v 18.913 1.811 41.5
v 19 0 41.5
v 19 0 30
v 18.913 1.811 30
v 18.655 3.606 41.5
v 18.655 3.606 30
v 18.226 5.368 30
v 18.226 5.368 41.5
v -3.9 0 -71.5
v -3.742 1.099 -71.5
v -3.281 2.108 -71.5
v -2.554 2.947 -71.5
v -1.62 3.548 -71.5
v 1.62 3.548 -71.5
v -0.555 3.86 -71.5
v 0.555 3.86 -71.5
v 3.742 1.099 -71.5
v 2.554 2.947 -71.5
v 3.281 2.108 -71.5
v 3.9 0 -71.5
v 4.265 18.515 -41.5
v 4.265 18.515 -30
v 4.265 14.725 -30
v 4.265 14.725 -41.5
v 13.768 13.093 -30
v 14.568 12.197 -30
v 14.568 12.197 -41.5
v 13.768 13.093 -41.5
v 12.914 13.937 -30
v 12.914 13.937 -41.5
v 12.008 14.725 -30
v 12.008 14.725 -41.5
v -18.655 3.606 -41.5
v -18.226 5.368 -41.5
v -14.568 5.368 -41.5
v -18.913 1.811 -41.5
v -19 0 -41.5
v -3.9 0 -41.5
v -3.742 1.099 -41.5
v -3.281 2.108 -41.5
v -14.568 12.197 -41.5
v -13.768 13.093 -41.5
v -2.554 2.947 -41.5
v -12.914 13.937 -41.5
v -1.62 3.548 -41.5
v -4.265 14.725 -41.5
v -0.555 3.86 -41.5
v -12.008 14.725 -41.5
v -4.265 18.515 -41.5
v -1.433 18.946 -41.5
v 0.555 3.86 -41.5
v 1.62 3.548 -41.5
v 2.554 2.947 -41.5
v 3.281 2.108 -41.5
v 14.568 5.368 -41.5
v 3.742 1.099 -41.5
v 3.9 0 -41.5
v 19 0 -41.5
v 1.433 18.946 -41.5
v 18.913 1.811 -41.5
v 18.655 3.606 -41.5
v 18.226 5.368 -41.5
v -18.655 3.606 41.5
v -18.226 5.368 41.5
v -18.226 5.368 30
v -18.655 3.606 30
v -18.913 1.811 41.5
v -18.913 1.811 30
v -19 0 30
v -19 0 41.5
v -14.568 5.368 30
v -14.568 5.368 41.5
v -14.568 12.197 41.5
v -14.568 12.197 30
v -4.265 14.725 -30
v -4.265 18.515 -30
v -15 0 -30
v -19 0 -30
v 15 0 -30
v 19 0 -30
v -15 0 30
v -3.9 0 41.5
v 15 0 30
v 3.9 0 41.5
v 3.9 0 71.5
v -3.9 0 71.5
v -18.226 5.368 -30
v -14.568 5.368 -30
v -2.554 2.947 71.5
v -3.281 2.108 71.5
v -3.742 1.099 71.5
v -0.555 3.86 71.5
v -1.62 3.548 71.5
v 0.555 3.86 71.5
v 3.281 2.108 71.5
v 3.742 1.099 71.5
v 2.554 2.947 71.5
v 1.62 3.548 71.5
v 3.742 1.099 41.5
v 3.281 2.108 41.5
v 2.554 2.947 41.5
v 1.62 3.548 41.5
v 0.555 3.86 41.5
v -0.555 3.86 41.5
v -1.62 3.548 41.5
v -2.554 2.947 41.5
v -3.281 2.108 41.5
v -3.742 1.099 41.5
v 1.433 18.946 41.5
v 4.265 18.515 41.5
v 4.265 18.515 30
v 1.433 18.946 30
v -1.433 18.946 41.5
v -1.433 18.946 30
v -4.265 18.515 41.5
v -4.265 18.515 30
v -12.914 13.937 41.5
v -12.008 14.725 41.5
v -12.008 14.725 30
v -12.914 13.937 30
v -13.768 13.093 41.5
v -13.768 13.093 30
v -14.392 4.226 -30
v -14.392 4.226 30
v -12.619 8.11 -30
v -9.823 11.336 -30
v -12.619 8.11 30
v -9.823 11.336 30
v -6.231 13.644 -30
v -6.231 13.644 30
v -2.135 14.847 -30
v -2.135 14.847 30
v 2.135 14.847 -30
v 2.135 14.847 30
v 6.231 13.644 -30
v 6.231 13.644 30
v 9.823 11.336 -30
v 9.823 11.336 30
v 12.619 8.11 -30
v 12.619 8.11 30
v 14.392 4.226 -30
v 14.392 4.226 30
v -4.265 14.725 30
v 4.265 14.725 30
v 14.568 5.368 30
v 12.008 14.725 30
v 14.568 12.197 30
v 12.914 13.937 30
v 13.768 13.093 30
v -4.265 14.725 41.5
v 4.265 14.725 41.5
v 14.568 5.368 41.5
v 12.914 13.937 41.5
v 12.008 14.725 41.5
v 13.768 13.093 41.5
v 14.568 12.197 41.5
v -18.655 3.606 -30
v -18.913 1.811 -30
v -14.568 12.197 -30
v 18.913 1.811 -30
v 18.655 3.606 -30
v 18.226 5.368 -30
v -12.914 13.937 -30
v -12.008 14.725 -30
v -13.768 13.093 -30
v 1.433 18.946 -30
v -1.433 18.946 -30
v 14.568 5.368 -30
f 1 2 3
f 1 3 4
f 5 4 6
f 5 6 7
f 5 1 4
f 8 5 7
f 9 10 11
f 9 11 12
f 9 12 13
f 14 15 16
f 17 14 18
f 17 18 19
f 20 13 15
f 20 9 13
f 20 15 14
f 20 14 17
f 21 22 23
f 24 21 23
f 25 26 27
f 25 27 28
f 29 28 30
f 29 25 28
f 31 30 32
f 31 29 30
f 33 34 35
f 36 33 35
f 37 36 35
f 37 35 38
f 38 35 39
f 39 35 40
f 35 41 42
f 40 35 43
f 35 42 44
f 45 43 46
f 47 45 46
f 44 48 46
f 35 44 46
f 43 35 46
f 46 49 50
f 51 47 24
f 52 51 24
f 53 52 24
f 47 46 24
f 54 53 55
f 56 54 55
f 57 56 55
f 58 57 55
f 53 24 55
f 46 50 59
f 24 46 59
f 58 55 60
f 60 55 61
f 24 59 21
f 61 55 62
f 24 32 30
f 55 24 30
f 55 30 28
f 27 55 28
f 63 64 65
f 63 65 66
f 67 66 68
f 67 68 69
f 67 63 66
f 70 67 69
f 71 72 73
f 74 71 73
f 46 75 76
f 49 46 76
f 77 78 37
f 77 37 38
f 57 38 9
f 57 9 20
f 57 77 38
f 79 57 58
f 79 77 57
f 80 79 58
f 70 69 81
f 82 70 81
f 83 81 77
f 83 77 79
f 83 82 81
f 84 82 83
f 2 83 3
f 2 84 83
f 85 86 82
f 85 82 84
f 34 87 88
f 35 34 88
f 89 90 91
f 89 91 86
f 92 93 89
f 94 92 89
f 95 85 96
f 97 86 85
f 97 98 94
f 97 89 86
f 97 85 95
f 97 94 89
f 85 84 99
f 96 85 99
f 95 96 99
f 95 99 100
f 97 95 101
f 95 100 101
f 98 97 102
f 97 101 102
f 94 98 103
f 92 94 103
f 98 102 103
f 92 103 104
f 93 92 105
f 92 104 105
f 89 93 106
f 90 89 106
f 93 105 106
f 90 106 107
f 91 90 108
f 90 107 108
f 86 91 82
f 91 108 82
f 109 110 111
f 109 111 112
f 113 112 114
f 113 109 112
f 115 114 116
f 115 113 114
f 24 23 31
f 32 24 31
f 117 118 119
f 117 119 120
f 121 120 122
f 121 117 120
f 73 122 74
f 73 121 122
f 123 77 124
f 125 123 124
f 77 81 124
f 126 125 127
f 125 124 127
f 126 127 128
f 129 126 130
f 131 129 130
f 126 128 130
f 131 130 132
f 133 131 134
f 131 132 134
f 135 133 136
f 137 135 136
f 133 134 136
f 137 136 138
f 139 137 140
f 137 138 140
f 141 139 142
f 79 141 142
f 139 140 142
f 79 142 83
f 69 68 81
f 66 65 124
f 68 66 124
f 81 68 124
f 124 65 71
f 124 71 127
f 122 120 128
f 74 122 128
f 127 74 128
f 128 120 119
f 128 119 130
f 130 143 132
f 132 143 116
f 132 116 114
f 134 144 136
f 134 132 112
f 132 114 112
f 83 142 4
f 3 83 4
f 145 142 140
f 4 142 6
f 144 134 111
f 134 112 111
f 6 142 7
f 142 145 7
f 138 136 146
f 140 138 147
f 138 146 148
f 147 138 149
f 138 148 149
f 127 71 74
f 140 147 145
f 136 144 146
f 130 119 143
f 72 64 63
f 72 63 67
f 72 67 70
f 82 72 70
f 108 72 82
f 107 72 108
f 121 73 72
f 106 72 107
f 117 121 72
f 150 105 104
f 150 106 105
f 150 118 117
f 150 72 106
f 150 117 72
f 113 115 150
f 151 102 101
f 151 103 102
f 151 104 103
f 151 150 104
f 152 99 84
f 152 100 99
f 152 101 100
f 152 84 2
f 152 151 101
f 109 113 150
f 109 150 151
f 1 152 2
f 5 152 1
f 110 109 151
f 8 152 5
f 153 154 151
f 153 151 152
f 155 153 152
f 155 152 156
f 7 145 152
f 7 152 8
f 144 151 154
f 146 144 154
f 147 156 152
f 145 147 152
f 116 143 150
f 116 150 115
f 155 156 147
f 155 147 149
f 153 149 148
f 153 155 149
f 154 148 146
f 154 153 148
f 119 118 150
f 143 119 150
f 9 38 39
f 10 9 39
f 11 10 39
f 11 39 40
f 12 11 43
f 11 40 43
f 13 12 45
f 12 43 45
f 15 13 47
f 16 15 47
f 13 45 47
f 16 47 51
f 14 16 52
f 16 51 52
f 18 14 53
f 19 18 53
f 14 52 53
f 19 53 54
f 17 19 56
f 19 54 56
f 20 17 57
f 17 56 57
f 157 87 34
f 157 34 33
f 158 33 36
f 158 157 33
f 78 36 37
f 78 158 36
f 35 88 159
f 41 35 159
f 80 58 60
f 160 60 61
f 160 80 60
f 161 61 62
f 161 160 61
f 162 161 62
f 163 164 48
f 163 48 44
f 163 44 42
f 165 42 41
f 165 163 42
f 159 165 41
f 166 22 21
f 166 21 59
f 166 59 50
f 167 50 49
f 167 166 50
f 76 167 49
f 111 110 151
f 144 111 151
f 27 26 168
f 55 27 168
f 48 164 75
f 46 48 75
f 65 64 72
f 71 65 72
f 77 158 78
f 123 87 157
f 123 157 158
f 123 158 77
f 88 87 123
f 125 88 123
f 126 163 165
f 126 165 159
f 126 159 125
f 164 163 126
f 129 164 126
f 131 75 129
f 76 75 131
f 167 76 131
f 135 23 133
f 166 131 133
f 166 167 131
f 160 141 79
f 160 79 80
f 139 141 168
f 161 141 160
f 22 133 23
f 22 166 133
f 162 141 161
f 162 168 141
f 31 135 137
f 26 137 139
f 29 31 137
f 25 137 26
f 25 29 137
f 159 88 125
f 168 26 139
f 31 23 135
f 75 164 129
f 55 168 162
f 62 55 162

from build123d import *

# Parameters (mm, degrees)
F1_DEPTH = 41.5
F3_DEPTH = 30
F5_DEPTH = 30
F7_DEPTH = 113.001
F9_DEPTH = 30


with BuildPart() as f1:
    # F0 (on Top) → F1 (new body, symmetric)
    with BuildSketch(Plane.XY):
        with BuildLine():
            Line((-19, 0), (19, 0))
            ThreePointArc((19, 0), (0, 19), (-19, 0))
        make_face()
    extrude(amount=F1_DEPTH, both=True)

    # F2 (on face) → F3 (join)
    with BuildSketch(Plane.XY.offset(41.5)):
        with BuildLine():
            Line((-3.9, 0), (3.9, 0))
            ThreePointArc((3.9, 0), (0, 3.9), (-3.9, 0))
        make_face()
    extrude(amount=F3_DEPTH)

    # F4 (on face) → F5 (join)
    with BuildSketch(Plane(origin=(0, 0, -41.5), x_dir=(1, 0, 0), z_dir=(0, 0, -1))):
        with BuildLine():
            Line((3.9, 0), (-3.9, 0))
            ThreePointArc((-3.9, 0), (0, -3.9), (3.9, 0))
        make_face()
    extrude(amount=F5_DEPTH)

    # F6 (on face) → F7 (cut, through all)
    with BuildSketch(Plane.XY.offset(41.5)):
        with BuildLine():
            Line((-14.568067, 5.368078), (-14.568067, 12.197189))
            ThreePointArc((-14.568067, 12.197189), (-16.748743, 8.971042), (-18.225909, 5.368078))
            Line((-18.225909, 5.368078), (-14.568067, 5.368078))
        make_face()
        with BuildLine():
            Line((-4.264999, 14.724803), (-4.264999, 18.515123))
            ThreePointArc((-4.264999, 18.515123), (-8.354055, 17.06487), (-12.007505, 14.724803))
            Line((-12.007505, 14.724803), (-4.264999, 14.724803))
        make_face()
        with BuildLine():
            ThreePointArc((12.007505, 14.724803), (8.354055, 17.06487), (4.264999, 18.515123))
            Line((4.264999, 18.515123), (4.264999, 14.724803))
            Line((4.264999, 14.724803), (12.007505, 14.724803))
        make_face()
        with BuildLine():
            ThreePointArc((18.225909, 5.368078), (16.748743, 8.971042), (14.568067, 12.197189))
            Line((14.568067, 12.197189), (14.568067, 5.368078))
            Line((14.568067, 5.368078), (18.225909, 5.368078))
        make_face()
    extrude(amount=-F7_DEPTH, mode=Mode.SUBTRACT)

    # F8 (on Top) → F9 (cut, symmetric)
    with BuildSketch(Plane.XY):
        with BuildLine():
            Line((15, 0), (22.459483, 0))
            ThreePointArc((22.459483, 0), (0, 22.459483), (-22.459483, 0))
            Line((-22.459483, 0), (-15, 0))
            ThreePointArc((-15, 0), (0, 15), (15, 0))
        make_face()
    extrude(amount=F9_DEPTH, both=True, mode=Mode.SUBTRACT)


solid = f1.part
